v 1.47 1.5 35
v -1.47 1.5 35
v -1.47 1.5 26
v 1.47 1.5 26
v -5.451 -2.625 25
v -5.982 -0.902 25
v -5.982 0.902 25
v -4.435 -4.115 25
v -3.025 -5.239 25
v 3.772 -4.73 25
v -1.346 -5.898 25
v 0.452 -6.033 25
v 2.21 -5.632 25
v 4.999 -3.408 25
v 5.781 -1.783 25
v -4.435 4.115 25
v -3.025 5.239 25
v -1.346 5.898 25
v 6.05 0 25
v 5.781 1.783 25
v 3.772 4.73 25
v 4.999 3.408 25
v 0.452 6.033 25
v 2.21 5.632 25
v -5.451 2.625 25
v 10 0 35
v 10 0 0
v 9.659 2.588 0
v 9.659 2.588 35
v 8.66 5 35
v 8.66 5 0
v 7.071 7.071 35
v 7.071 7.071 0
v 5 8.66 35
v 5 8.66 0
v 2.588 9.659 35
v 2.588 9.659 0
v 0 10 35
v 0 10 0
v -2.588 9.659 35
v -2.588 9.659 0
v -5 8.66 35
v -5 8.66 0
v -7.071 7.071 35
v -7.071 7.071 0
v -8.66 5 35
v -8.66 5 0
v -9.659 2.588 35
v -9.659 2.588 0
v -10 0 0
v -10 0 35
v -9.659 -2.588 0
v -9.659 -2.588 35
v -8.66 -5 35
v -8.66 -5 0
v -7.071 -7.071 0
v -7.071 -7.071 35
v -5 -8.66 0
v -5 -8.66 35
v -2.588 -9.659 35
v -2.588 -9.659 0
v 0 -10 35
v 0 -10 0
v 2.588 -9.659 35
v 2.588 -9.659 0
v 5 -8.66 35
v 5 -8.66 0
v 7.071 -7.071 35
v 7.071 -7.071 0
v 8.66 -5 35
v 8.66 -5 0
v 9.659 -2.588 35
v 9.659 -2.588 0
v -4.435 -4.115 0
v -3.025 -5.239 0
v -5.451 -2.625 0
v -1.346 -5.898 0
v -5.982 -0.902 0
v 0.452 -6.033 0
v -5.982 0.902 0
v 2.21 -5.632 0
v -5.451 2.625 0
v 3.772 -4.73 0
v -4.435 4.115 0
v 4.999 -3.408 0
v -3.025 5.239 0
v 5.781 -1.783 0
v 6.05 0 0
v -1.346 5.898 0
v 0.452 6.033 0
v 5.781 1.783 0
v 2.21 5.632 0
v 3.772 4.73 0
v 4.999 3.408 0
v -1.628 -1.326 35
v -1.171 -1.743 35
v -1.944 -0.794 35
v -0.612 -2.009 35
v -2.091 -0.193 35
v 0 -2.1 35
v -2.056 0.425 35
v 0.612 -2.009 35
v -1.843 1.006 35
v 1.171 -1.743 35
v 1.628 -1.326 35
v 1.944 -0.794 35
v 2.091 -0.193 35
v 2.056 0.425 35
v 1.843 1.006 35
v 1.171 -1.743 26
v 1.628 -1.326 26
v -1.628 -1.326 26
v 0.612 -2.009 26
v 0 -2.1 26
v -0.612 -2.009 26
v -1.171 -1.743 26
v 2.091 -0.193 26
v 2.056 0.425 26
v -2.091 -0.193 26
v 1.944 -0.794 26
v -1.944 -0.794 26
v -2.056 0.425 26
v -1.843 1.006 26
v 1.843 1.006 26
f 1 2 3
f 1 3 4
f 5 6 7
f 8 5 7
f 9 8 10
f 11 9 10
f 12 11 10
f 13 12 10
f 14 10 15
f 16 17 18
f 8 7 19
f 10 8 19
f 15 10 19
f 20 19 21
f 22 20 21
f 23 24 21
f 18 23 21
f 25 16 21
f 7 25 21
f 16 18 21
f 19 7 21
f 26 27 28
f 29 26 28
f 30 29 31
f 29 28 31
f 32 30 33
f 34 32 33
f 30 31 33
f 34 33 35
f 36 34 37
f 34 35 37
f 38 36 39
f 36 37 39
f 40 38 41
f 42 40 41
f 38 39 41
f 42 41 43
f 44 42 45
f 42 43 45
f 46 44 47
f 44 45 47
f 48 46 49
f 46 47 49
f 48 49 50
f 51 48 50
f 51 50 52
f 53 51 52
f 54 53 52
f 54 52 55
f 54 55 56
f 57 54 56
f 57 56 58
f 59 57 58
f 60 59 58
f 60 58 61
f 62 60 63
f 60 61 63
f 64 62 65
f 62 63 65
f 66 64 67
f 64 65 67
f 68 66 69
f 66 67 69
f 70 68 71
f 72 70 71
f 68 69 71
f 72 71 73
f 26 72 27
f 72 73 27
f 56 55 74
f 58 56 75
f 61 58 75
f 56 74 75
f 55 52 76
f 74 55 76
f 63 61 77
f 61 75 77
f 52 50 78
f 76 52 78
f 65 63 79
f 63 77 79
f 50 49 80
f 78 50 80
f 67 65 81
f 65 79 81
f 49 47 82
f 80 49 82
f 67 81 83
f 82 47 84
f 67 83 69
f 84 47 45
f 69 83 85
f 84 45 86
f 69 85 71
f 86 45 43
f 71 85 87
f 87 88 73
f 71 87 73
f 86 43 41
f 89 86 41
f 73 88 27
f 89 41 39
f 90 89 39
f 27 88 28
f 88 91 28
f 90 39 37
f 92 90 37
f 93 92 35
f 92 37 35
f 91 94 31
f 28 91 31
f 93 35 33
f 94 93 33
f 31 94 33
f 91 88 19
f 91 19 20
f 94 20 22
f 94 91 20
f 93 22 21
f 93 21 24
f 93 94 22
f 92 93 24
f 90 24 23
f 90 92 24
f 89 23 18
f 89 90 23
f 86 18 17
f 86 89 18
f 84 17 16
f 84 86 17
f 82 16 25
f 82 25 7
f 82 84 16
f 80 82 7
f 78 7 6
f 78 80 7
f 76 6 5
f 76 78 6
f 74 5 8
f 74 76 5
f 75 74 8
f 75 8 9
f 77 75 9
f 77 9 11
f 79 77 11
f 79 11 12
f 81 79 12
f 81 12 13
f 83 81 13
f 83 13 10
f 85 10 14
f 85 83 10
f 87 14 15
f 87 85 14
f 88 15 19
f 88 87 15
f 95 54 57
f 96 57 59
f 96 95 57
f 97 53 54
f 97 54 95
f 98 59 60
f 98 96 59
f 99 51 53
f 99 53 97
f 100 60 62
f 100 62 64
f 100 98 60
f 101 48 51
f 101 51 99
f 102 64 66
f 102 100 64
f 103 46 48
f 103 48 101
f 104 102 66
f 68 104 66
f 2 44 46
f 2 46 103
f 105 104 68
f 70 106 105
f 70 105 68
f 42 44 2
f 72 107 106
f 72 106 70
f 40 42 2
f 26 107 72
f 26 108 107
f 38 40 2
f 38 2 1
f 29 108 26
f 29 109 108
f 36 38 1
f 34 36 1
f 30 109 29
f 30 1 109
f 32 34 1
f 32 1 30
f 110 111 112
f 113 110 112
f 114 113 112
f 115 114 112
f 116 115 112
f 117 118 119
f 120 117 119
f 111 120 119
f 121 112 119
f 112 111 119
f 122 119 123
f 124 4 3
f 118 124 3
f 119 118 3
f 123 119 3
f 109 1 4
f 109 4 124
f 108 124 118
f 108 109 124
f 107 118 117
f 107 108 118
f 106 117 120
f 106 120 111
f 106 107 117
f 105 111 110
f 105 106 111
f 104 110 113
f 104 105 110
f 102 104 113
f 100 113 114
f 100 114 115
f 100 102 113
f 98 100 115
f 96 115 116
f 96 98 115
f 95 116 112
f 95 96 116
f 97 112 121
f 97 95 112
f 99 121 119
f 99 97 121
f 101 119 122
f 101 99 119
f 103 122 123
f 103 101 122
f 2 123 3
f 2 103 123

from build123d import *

# Parameters (mm, degrees)
ESQUISSE1_R             = 10
BOSS_EXTRU_1_DEPTH      = 35
ESQUISSE1_3_R           = 6.05
ENL_V_MAT_EXTRU_1_DEPTH = 25
ENL_V_MAT_EXTRU_2_DEPTH = 9


with BuildPart() as part:
    # Esquisse1 → Boss.-Extru.1 (new body)
    with BuildSketch(Plane.XY):
        Circle(ESQUISSE1_R)
    extrude(amount=BOSS_EXTRU_1_DEPTH)

    # Esquisse1<3> → Enlèv. mat.-Extru.1 (cut)
    with BuildSketch(Plane.XY):
        Circle(ESQUISSE1_3_R)
    extrude(amount=ENL_V_MAT_EXTRU_1_DEPTH, mode=Mode.SUBTRACT)

    # Esquisse2 → Enlèv. mat.-Extru.2 (cut)
    with BuildSketch(Plane.XY.offset(35)):
        with BuildLine():
            Line((-1.469693846, 1.5), (1.469693846, 1.5))
            ThreePointArc((1.469693846, 1.5), (0, -2.1), (-1.469693846, 1.5))
        make_face()
    extrude(amount=-ENL_V_MAT_EXTRU_2_DEPTH, mode=Mode.SUBTRACT)


solid = part.part
